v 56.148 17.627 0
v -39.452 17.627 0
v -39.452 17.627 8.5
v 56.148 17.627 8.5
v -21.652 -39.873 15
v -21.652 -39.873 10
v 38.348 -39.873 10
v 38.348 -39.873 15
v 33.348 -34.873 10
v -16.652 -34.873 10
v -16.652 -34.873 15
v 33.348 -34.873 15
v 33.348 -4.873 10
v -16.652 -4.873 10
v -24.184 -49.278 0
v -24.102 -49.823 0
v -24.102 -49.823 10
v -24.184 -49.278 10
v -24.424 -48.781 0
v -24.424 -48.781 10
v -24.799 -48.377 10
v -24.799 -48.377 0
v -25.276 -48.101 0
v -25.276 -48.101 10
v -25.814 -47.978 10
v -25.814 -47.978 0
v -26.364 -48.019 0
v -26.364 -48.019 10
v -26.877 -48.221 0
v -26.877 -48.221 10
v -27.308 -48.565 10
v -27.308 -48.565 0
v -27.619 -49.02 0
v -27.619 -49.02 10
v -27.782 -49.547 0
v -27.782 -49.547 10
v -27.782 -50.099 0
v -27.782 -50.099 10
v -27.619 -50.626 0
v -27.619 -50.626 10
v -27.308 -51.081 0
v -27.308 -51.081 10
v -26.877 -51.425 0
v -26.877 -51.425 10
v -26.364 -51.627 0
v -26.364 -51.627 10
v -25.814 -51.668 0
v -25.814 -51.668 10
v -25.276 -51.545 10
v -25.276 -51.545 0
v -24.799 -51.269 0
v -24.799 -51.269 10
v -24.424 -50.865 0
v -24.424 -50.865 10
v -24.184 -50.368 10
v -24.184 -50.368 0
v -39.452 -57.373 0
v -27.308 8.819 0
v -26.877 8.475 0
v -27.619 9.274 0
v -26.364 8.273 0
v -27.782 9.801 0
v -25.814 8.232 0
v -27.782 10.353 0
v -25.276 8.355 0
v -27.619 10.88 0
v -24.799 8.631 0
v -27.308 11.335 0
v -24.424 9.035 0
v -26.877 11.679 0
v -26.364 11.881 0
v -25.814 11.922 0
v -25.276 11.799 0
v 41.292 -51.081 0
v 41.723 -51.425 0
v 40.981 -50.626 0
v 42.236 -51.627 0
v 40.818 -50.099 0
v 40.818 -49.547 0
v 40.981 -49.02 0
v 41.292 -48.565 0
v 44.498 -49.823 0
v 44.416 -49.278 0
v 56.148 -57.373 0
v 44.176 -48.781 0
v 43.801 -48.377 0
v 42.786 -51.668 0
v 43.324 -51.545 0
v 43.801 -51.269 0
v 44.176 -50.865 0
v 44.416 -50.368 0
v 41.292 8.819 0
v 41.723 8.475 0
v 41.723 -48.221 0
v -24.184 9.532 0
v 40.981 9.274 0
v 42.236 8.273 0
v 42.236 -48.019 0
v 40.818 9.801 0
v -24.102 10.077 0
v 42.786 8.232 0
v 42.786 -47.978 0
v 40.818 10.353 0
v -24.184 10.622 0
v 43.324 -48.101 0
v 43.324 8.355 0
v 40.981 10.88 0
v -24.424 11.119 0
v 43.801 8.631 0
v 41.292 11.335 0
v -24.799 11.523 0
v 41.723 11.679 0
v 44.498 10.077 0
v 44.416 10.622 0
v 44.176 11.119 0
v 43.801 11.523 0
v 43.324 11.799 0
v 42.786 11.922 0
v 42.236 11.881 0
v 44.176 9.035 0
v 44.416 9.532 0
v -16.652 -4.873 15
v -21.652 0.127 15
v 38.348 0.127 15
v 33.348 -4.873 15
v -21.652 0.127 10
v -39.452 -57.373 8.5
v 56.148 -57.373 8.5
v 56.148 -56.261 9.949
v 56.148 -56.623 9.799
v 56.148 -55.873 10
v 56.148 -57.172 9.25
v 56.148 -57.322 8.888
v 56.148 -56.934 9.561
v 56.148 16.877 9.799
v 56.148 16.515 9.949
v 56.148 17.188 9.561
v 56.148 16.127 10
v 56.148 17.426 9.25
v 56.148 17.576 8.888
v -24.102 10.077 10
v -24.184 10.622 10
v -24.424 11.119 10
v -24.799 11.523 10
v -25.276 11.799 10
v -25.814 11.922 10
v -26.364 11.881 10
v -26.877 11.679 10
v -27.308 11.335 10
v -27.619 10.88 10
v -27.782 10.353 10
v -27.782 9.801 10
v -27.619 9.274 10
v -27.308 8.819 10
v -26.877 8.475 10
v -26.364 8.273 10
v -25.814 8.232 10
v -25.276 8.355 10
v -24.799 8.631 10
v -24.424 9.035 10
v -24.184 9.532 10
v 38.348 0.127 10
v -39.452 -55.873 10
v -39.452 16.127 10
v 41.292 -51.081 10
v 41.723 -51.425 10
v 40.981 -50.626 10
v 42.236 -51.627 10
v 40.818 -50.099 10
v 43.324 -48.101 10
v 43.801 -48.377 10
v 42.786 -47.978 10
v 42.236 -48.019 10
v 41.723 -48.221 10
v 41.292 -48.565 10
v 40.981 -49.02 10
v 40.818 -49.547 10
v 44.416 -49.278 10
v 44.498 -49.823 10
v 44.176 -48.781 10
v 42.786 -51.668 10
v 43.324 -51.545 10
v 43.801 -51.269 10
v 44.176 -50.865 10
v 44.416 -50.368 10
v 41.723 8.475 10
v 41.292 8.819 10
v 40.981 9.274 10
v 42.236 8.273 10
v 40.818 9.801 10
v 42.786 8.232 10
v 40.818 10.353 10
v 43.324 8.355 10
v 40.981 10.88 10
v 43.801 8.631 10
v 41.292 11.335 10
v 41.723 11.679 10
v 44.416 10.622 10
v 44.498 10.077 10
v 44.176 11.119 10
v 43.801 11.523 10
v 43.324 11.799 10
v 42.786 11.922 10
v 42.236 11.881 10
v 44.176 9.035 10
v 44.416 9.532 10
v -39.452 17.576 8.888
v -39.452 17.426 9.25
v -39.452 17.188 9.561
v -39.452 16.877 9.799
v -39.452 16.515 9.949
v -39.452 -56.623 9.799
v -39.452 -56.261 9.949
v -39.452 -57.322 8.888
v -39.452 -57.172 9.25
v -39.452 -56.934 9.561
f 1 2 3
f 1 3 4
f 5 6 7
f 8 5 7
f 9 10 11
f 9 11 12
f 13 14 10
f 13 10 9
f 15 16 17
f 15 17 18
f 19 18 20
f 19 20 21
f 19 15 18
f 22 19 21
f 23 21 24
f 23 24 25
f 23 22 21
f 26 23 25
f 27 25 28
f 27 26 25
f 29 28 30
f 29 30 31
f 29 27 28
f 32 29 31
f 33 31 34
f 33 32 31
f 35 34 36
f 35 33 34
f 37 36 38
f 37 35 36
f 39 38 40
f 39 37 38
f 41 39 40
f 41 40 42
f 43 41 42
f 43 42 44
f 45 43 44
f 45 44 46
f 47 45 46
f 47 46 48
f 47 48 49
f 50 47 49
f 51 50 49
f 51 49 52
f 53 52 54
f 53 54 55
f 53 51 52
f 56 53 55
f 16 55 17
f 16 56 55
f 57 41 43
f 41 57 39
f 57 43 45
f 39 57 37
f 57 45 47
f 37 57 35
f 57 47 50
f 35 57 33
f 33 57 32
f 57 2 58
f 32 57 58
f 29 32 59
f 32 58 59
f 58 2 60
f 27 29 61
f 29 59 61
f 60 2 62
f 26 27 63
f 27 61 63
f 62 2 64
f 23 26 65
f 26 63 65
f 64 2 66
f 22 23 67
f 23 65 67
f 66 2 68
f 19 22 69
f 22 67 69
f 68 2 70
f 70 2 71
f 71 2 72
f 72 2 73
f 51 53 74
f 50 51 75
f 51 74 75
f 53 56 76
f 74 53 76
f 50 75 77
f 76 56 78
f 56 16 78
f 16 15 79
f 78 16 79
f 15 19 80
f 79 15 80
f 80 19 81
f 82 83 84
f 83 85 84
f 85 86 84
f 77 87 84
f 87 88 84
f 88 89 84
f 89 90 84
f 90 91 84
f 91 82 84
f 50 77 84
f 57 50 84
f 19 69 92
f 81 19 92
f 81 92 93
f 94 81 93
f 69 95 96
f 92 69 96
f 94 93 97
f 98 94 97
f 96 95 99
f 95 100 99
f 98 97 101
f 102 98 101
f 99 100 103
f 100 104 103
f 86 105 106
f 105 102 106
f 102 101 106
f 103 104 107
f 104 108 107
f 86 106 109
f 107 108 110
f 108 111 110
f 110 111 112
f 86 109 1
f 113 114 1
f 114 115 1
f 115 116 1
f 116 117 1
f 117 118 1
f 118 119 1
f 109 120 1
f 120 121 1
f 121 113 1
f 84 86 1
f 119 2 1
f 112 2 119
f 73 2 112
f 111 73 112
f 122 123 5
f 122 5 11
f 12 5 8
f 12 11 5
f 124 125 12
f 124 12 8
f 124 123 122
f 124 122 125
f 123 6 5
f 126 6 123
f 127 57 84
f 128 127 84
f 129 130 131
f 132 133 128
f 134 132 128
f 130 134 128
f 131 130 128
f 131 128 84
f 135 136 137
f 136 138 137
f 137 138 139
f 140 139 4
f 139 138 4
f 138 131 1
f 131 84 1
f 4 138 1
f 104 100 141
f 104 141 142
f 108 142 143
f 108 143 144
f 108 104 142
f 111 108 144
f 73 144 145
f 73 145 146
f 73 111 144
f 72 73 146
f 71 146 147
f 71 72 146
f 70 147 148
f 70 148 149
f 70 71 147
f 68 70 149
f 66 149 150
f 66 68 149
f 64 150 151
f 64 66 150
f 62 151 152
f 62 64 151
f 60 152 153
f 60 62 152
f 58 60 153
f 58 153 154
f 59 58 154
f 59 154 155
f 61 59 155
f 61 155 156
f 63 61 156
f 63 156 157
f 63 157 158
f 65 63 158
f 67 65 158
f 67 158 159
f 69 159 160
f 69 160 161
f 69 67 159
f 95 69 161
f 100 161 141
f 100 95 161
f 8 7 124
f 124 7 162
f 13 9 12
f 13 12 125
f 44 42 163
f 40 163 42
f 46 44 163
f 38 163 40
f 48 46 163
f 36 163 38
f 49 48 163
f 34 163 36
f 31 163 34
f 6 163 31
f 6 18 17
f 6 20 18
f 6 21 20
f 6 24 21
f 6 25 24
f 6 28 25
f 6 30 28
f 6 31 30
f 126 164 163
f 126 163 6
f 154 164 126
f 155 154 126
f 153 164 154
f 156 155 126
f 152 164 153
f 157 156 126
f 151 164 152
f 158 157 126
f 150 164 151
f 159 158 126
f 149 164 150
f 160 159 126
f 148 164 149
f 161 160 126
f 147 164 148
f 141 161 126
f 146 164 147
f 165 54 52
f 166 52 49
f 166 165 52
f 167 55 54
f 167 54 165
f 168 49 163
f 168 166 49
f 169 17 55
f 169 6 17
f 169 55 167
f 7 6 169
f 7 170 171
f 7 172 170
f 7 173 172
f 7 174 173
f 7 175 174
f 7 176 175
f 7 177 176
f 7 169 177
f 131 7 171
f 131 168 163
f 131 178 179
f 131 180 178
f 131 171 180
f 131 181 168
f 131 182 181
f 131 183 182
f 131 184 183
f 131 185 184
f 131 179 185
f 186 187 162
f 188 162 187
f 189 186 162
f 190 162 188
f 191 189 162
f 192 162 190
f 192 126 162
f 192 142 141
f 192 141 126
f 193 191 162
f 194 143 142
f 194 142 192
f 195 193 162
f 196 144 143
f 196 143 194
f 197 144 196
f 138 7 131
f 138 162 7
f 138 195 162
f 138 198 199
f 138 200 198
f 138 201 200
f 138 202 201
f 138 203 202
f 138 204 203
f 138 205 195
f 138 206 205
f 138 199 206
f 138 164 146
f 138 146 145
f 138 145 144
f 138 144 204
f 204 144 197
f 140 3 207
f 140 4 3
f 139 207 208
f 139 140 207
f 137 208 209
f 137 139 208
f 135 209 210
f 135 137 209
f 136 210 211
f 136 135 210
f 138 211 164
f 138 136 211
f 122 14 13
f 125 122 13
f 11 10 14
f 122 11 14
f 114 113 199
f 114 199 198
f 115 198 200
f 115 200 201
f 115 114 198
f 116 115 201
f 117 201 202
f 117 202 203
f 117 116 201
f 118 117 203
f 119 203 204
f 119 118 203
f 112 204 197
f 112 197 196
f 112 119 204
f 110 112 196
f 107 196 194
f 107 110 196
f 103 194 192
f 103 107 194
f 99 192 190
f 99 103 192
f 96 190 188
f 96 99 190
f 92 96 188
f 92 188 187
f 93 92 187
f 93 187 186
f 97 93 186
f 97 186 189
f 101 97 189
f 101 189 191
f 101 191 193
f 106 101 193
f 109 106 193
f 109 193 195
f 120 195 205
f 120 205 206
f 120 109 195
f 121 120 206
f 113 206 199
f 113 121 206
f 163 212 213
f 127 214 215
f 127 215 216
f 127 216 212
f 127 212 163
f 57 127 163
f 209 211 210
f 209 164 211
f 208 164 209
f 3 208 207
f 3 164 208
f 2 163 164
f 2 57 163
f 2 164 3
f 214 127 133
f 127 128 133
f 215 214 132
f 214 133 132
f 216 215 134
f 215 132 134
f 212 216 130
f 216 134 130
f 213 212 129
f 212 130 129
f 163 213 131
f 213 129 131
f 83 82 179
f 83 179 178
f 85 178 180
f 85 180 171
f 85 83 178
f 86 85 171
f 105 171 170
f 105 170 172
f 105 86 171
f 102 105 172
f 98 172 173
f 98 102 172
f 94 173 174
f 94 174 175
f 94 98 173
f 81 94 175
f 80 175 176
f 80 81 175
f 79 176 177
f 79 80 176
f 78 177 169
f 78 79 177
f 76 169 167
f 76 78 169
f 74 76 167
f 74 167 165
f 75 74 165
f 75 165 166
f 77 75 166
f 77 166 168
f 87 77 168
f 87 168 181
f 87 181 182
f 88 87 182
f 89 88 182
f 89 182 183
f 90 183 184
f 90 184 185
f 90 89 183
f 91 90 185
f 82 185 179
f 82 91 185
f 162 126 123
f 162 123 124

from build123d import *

# Parameters (mm, degrees)
SKETCH_1_W      = 95.6
SKETCH_1_H      = 75
SKETCH_1_R      = 1.85
EXTRUDE_1_DEPTH = 10
FILLET_1_R      = 1.5
SKETCH_2_W      = 60
SKETCH_2_H      = 40
SKETCH_2_W_2    = 50
SKETCH_2_H_2    = 30
EXTRUDE_2_DEPTH = 5


with BuildPart() as part:
    # 草圖1 → 填料-伸長1 (new body)
    with BuildSketch(Plane.XY):
        with Locations((8.347810078, -19.873101952)):
            Rectangle(SKETCH_1_W, SKETCH_1_H)
        with Locations((-25.952189922, 10.076898048)):
            Circle(SKETCH_1_R, mode=Mode.SUBTRACT)
        with Locations((42.647810078, 10.076898048)):
            Circle(SKETCH_1_R, mode=Mode.SUBTRACT)
        with Locations((-25.952189922, -49.823101952)):
            Circle(SKETCH_1_R, mode=Mode.SUBTRACT)
        with Locations((42.647810078, -49.823101952)):
            Circle(SKETCH_1_R, mode=Mode.SUBTRACT)
    extrude(amount=EXTRUDE_1_DEPTH)

    # 圓角1
    fillet_1_edges = [part.edges().sort_by_distance(p)[0] for p in [
        (8.347810078, 17.626898048, 10),
        (8.347810078, -57.373101952, 10),
    ]]
    fillet(fillet_1_edges, radius=FILLET_1_R)

    # 草圖2 → 填料-伸長2 (add)
    with BuildSketch(Plane.XY.offset(10)):
        with Locations((8.347810078, -19.873101952)):
            Rectangle(SKETCH_2_W, SKETCH_2_H)
        with Locations((8.347810078, -19.873101952)):
            Rectangle(SKETCH_2_W_2, SKETCH_2_H_2, mode=Mode.SUBTRACT)
    extrude(amount=EXTRUDE_2_DEPTH)


solid = part.part
